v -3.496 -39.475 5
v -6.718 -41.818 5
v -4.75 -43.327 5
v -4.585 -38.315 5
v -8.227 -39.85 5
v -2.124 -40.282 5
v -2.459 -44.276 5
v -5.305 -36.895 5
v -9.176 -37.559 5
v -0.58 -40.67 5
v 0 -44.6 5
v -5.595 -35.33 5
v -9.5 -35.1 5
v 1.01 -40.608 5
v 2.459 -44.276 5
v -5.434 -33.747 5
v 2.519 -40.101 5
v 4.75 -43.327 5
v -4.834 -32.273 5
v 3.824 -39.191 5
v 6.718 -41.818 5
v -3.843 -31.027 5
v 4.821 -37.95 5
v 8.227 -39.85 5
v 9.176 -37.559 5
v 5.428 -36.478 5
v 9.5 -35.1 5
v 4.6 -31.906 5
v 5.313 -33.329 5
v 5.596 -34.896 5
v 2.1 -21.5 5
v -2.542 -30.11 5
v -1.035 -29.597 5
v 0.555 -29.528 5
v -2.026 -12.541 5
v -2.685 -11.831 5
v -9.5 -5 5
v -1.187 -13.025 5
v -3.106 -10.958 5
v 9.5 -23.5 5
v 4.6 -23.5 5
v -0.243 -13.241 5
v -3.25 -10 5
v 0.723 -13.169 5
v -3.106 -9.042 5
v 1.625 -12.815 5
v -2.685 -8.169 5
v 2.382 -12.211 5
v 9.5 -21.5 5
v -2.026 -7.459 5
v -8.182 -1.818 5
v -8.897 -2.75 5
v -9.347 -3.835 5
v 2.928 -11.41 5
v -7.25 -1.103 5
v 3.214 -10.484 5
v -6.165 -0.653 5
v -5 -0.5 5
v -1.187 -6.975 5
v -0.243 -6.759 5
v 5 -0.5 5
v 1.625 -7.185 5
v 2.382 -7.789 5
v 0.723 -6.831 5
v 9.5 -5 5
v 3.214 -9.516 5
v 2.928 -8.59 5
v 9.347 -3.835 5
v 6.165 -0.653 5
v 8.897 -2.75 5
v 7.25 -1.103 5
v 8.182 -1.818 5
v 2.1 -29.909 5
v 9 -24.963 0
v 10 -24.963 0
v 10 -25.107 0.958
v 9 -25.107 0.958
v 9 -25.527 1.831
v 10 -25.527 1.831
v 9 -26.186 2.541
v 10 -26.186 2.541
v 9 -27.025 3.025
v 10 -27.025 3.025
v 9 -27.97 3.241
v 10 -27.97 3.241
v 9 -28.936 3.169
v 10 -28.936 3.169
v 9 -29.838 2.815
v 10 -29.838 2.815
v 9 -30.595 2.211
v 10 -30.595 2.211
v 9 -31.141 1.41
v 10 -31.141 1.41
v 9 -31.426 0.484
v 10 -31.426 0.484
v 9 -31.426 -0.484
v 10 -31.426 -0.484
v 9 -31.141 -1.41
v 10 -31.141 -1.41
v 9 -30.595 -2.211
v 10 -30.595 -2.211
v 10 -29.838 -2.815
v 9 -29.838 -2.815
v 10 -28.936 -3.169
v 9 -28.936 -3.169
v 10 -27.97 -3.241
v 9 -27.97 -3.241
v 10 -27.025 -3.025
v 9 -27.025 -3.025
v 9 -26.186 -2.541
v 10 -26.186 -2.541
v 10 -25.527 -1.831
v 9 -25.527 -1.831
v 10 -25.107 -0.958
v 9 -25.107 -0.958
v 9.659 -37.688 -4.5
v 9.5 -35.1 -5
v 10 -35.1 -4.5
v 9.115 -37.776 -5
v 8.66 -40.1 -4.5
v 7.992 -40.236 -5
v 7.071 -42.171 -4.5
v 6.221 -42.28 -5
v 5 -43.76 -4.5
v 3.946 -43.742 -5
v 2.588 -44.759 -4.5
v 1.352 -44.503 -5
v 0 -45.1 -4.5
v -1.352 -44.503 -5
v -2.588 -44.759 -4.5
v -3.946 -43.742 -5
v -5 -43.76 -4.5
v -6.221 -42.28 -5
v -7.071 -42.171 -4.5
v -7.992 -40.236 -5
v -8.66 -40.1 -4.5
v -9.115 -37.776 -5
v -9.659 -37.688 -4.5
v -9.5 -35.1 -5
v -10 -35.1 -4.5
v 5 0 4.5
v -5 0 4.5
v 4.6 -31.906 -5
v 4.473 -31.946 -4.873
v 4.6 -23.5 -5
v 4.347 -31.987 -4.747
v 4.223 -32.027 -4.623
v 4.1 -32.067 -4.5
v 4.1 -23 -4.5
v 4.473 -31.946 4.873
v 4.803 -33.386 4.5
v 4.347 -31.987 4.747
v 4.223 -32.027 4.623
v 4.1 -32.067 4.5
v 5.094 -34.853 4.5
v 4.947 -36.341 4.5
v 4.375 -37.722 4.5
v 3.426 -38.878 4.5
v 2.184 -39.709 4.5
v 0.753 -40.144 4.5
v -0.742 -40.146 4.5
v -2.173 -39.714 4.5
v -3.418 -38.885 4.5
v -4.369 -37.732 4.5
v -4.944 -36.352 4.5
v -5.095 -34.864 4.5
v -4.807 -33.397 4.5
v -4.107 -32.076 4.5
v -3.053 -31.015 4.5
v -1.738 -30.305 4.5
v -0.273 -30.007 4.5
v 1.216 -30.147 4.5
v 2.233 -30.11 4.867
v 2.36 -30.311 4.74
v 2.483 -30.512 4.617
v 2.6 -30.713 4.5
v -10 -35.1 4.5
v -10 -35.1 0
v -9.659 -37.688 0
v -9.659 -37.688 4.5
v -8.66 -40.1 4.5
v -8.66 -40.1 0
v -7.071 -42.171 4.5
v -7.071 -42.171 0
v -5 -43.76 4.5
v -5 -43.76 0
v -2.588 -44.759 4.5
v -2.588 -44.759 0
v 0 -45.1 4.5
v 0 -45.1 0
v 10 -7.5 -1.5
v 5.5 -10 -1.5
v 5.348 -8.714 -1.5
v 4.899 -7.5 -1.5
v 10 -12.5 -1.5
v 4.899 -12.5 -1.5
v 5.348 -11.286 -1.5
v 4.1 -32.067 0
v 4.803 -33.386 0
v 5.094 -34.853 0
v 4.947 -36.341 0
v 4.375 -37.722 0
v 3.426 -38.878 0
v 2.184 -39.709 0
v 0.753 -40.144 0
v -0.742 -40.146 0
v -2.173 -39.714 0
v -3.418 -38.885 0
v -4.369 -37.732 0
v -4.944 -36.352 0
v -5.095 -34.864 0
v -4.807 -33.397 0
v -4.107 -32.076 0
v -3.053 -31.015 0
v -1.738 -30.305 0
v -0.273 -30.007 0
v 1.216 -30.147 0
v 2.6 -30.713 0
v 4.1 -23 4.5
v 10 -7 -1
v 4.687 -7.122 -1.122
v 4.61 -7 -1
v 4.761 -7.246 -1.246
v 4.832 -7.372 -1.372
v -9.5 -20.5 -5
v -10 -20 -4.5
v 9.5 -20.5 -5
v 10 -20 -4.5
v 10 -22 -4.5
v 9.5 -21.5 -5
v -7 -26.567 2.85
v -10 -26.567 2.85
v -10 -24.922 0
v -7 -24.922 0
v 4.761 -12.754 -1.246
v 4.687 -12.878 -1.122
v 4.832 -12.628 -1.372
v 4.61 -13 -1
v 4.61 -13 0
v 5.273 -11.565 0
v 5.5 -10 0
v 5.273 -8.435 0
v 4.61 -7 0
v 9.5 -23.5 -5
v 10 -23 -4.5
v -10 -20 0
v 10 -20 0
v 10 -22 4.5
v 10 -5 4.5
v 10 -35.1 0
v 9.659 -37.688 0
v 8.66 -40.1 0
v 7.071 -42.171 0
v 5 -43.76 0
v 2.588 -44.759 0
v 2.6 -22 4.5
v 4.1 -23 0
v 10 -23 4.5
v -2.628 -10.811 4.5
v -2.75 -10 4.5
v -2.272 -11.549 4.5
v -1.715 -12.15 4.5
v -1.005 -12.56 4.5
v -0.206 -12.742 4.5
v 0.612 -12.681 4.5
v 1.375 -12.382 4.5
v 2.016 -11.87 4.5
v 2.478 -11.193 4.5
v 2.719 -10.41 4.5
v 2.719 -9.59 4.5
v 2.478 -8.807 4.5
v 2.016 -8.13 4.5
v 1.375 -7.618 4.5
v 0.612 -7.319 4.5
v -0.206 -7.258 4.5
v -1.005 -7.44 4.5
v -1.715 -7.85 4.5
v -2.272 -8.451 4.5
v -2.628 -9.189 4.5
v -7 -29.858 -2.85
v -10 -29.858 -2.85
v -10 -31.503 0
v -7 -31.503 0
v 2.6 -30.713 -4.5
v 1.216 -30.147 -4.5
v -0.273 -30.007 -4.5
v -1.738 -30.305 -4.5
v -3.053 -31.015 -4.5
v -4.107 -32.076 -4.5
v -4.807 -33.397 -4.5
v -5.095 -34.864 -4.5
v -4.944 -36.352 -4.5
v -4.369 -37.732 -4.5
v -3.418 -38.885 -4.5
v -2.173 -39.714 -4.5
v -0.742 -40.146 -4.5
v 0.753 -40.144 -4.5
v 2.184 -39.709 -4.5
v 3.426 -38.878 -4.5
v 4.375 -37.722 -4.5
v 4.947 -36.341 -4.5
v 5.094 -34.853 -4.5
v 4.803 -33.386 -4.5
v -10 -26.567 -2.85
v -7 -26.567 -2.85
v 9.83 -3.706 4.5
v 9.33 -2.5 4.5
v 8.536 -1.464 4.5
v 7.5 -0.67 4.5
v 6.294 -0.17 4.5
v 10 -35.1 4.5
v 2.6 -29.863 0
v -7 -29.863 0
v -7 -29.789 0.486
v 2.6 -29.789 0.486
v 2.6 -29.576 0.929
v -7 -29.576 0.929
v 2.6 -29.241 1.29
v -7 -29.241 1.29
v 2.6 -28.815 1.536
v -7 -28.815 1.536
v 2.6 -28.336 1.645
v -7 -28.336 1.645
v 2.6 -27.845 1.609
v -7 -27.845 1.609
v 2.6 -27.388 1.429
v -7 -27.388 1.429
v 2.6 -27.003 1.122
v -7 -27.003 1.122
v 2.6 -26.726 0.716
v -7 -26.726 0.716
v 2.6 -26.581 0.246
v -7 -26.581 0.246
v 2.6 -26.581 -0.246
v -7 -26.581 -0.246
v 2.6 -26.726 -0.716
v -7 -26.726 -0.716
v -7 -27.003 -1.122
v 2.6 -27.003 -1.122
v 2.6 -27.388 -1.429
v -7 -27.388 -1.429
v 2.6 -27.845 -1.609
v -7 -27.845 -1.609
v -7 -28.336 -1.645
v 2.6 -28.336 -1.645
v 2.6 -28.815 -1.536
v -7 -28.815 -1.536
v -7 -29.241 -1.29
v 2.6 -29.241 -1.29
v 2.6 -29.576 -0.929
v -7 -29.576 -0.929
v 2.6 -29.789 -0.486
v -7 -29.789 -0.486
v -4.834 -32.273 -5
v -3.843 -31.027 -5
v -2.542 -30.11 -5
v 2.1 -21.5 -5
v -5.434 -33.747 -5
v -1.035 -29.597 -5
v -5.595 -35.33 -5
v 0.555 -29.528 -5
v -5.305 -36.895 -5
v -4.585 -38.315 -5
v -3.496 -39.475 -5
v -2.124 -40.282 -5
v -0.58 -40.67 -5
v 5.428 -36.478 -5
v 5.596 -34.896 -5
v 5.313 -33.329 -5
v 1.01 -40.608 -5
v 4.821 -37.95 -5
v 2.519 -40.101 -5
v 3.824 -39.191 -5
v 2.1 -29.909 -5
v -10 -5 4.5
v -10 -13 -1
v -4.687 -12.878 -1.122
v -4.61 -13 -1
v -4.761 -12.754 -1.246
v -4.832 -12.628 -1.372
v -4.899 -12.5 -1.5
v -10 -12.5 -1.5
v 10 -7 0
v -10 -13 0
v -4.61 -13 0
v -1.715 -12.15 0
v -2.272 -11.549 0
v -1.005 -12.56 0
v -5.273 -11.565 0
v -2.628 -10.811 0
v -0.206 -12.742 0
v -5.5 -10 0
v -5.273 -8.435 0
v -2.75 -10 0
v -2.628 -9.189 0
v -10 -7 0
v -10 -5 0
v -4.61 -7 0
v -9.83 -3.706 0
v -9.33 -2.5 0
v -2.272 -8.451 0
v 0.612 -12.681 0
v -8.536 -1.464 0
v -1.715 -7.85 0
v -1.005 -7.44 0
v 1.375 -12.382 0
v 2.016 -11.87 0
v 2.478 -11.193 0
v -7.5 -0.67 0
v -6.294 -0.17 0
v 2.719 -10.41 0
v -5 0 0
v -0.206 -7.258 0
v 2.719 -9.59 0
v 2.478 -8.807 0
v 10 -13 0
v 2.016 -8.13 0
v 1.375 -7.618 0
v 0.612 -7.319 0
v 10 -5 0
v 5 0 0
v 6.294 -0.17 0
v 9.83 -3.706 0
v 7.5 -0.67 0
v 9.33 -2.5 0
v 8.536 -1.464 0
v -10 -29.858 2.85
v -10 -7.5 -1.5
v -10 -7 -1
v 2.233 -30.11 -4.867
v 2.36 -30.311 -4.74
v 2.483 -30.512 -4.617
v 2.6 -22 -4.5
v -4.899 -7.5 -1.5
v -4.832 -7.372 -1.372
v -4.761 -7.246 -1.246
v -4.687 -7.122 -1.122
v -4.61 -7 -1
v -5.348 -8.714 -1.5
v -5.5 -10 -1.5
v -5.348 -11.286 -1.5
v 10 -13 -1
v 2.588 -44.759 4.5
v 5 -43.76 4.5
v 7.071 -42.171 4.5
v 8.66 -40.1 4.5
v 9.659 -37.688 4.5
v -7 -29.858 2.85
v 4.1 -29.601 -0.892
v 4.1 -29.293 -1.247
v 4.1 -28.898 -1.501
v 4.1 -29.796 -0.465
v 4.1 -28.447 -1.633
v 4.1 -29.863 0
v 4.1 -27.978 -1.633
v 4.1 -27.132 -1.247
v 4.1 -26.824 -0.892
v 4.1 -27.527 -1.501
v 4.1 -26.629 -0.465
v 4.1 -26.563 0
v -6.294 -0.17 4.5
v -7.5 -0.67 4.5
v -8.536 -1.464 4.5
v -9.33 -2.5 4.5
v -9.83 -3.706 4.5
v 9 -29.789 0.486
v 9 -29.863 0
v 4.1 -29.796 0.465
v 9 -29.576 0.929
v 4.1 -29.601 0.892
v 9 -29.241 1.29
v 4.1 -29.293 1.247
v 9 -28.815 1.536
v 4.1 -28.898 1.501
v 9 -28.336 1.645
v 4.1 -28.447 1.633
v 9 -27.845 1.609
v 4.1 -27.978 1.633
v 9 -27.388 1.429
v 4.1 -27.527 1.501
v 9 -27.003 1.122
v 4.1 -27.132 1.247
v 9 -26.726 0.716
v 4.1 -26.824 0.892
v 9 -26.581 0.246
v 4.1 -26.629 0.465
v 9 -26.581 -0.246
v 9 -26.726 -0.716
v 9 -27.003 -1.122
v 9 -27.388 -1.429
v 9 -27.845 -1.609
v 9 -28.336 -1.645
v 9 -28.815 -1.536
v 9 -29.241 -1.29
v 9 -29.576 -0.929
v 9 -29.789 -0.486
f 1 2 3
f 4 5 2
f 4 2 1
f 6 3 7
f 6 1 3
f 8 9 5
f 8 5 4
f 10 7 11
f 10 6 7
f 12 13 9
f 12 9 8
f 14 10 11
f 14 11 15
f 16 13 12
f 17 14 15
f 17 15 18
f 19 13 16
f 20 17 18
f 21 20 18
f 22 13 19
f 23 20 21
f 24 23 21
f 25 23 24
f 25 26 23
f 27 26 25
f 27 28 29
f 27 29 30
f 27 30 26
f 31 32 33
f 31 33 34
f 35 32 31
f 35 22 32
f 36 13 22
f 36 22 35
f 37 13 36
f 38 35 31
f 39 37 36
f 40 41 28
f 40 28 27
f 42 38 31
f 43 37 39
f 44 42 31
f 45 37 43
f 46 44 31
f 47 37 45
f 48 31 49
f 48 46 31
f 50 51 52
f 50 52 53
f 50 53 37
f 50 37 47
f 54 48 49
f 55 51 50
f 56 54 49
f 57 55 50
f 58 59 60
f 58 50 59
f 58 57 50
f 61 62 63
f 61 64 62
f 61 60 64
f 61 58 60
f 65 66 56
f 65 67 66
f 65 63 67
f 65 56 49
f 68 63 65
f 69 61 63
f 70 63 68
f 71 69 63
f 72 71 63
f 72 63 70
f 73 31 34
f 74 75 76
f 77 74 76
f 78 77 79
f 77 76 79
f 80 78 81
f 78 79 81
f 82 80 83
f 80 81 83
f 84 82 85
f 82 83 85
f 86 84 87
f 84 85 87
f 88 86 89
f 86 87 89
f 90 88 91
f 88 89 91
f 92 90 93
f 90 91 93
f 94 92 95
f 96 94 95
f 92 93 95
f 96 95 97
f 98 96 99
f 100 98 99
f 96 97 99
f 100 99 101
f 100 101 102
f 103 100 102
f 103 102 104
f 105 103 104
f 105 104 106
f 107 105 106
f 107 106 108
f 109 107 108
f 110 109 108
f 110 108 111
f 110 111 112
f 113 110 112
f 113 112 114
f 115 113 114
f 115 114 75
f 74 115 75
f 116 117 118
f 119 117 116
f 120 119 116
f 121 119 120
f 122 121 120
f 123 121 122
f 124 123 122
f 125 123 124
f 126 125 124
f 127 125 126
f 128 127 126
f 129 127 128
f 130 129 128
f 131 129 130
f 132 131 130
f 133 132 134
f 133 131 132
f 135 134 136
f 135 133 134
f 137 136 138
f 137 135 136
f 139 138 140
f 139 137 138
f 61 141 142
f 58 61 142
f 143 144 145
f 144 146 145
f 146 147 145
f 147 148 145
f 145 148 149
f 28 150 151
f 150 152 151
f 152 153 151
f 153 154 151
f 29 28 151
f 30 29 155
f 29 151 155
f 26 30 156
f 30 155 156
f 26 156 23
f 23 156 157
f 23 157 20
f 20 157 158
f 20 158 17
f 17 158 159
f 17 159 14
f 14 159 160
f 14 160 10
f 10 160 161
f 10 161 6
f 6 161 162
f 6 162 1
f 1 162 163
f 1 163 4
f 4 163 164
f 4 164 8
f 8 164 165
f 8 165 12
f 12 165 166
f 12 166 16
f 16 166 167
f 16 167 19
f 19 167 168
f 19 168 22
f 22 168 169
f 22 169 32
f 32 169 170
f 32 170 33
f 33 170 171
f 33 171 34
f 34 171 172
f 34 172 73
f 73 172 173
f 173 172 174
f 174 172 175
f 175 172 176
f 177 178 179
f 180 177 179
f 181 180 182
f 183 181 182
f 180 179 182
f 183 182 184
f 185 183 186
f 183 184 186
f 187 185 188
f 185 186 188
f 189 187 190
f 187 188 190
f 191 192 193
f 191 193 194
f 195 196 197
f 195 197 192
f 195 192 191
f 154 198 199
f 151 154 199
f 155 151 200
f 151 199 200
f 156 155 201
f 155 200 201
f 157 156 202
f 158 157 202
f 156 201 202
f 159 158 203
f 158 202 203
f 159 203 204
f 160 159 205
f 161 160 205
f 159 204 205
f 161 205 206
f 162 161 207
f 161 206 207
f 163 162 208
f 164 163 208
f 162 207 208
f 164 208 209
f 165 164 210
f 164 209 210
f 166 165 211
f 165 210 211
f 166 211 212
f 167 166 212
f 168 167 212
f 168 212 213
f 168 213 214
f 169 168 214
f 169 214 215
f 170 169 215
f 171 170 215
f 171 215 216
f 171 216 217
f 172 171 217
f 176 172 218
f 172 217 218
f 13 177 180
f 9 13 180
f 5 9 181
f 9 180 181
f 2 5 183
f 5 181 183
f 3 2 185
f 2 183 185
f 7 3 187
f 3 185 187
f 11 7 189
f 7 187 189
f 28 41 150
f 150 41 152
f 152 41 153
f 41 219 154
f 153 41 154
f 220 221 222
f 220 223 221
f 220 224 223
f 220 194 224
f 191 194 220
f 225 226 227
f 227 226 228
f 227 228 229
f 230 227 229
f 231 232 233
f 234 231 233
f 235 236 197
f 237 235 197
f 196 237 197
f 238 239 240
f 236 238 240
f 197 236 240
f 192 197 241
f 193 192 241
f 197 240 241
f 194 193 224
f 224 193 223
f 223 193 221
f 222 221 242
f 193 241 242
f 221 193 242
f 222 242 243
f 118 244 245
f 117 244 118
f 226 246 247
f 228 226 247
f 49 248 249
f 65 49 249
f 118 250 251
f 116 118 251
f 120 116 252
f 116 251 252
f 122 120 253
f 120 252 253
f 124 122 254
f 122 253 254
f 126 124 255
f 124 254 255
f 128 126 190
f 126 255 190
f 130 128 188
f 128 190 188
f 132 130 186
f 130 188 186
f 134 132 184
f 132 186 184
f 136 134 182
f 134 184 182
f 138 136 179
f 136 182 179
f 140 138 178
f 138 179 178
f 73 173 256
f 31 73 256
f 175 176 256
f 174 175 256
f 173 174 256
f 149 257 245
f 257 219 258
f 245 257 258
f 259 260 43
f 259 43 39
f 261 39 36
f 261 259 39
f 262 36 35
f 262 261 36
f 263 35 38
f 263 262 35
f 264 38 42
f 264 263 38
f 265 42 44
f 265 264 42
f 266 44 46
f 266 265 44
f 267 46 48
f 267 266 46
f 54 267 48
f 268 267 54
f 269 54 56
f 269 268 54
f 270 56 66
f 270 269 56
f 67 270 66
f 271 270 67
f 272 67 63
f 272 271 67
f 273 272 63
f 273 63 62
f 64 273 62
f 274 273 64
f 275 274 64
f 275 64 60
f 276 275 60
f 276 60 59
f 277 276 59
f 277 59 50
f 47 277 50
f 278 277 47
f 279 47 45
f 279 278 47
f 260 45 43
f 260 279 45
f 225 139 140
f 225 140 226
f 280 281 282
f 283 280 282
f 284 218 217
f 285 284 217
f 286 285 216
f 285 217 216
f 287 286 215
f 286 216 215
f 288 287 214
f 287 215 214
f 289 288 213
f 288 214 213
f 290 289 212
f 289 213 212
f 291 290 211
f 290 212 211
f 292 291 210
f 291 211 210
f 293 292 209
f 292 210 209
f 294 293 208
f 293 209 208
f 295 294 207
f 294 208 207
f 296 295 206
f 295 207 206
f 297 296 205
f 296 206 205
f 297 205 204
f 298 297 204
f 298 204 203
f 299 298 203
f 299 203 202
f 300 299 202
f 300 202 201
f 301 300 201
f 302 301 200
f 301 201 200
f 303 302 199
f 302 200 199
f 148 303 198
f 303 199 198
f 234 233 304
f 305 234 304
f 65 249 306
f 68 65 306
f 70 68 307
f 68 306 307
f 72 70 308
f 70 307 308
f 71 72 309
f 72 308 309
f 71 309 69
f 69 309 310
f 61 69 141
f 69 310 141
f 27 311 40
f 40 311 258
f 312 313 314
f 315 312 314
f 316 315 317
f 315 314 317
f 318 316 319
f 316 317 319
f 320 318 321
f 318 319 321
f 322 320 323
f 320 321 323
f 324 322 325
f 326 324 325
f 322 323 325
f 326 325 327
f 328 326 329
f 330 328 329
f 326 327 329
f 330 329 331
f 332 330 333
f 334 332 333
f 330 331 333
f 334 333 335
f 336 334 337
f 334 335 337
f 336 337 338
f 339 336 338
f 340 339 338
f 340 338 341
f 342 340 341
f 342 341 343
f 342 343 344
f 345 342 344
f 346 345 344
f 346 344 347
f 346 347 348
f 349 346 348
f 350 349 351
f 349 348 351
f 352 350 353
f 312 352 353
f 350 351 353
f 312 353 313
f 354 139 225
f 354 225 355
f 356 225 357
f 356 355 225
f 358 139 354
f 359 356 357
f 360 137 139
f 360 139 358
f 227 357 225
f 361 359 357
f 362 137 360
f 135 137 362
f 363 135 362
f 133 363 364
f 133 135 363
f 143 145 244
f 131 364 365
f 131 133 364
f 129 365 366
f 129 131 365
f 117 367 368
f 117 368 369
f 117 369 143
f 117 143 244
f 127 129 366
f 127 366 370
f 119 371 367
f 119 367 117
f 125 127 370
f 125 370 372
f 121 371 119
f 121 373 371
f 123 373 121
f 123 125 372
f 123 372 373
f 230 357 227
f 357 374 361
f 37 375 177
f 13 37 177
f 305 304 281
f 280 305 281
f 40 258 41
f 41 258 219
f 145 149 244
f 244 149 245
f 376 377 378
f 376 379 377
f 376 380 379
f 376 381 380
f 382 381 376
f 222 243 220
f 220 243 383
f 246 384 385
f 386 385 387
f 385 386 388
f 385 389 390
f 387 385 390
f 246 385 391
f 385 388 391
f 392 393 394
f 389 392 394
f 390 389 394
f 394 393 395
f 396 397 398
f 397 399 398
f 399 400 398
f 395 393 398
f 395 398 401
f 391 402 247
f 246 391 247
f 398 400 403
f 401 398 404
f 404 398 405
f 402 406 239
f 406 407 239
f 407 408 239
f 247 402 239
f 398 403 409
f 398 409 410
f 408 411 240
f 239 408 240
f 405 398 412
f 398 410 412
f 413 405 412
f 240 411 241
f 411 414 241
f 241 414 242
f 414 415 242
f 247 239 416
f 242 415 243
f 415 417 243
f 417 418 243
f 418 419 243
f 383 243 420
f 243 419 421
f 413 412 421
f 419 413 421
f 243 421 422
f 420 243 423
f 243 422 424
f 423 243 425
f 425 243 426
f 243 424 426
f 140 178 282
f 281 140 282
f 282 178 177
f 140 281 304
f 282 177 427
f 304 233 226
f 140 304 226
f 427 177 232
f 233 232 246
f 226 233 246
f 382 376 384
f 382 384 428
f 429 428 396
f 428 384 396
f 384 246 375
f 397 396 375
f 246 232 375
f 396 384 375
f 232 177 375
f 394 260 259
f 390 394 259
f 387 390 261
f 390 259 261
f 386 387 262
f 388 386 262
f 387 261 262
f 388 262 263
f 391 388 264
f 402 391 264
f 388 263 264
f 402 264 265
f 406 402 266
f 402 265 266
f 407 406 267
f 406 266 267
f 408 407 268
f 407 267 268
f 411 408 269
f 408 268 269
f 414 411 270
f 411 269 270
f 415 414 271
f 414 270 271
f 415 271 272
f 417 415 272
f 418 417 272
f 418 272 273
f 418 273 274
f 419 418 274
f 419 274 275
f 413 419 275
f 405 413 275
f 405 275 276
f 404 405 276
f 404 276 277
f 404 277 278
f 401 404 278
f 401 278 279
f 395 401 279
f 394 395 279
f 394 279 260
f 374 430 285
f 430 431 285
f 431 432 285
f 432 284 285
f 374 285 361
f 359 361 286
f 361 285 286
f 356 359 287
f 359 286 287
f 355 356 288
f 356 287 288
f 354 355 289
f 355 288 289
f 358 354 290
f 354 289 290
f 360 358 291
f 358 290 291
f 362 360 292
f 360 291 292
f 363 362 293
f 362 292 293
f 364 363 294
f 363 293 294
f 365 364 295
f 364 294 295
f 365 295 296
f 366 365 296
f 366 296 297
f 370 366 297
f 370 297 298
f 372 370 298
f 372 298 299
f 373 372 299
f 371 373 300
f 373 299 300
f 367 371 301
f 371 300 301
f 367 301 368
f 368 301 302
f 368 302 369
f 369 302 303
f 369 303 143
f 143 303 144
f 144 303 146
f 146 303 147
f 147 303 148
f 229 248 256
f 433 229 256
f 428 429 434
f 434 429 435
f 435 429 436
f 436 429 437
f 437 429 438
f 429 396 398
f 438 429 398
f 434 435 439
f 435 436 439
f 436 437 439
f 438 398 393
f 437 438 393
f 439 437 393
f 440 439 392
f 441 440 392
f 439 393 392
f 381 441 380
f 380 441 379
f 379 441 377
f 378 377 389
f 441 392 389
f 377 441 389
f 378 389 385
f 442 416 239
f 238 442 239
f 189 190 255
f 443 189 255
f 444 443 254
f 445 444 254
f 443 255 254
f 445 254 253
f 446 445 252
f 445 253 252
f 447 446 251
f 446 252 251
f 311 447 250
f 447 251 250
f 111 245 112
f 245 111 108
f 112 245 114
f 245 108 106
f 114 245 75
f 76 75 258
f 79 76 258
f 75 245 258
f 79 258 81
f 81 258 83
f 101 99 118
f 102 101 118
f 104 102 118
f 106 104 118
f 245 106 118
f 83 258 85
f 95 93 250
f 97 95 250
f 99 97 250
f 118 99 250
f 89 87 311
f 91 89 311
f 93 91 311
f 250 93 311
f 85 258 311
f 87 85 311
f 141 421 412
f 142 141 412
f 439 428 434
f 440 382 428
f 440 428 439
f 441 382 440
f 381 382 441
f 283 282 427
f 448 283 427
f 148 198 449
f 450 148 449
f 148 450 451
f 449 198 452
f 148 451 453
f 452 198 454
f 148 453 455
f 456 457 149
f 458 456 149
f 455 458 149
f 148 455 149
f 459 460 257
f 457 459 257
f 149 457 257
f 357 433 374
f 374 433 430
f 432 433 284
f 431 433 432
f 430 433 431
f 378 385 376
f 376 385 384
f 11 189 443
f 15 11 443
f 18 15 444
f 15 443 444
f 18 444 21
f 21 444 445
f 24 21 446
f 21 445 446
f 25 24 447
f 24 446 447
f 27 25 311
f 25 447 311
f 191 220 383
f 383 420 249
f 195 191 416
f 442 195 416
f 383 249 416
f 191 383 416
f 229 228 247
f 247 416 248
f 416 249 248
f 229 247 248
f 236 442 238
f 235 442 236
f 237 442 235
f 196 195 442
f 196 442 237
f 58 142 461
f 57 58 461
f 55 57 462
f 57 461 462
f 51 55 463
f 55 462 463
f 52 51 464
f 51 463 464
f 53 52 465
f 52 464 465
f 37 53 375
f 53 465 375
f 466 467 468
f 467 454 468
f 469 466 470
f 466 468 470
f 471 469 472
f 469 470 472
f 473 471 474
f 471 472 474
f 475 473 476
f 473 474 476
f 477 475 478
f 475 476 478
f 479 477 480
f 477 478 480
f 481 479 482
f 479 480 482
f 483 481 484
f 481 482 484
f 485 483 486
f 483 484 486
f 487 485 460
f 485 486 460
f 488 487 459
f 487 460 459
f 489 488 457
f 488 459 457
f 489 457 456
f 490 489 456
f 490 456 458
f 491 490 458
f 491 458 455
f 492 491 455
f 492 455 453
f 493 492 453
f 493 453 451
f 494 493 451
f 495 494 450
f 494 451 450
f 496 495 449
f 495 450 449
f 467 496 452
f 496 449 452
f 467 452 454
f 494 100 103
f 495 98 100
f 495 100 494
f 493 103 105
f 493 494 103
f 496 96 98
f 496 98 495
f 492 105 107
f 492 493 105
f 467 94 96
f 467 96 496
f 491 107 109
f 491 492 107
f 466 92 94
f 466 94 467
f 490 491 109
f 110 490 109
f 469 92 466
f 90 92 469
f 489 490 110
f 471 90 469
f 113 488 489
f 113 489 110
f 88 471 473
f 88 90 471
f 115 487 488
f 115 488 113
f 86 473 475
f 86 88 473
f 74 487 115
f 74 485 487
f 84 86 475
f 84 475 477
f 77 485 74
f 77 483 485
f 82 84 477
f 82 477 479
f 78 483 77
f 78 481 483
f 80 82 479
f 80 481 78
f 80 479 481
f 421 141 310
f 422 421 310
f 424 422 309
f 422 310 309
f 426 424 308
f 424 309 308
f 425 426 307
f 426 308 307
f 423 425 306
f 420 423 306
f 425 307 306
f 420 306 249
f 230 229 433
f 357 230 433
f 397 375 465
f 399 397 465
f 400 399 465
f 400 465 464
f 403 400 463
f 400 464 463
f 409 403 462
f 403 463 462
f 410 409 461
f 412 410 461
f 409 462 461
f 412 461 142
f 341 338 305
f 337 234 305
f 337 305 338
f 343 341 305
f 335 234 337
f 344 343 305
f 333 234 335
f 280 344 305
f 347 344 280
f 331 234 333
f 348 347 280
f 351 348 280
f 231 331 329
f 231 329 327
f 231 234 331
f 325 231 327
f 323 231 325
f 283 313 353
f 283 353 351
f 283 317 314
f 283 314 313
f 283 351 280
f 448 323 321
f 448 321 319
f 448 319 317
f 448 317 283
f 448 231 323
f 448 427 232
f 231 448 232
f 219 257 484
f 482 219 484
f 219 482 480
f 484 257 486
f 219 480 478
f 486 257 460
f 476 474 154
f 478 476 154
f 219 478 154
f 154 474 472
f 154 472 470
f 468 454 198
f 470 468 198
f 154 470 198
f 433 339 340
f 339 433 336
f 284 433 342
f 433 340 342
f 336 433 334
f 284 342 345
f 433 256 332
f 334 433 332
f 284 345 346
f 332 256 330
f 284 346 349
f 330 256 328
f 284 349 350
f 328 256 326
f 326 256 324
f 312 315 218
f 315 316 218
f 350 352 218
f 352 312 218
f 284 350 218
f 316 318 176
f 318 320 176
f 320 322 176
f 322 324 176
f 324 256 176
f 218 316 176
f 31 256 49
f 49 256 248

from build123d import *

# Parameters (mm, degrees)
F1_DEPTH       = 5
F3_DEPTH       = 5
F5_D           = 3.3
F5_DEPTH       = 26
F5_CBORE_D     = 6.5
F5_CBORE_DEPTH = 1
F5_TIP         = 0.9914200214
F7_DEPTH       = 3
F9_DEPTH       = 1.5
F10_D          = 5.5
F10_DEPTH      = 26
F10_TIP        = 1.6523667023
F11_SIZE       = 0.5
F13_R          = 5
F14_SIZE       = 0.5


with BuildPart() as f1:
    # F0 (on Top) → F1 (new body)
    with BuildSketch(Plane.XY):
        with BuildLine():
            Line((10, 0), (-10, 0))
            Line((-10, 0), (-10, -35.1))
            ThreePointArc((-10, -35.1), (-7.0710678119, -42.1710678119), (0, -45.1))
            ThreePointArc((0, -45.1), (7.0710678119, -42.1710678119), (10, -35.1))
            Line((10, -35.1), (10, -23))
            Line((10, -23), (4.1, -23))
            Line((4.1, -23), (4.1, -32.0668498224))
            ThreePointArc((4.1, -32.0668498224), (-3.4177556675, -38.8853594542), (2.6, -30.7125178063))
            Line((2.6, -30.7125178063), (2.6, -22))
            Line((2.6, -22), (10, -22))
            Line((10, -22), (10, 0))
        make_face()
    extrude(amount=F1_DEPTH)

    # F2 (on face) → F3 (join)
    with BuildSketch(Plane(origin=(0, 0, 0), x_dir=(1, 0, 0), z_dir=(0, 0, -1))):
        with BuildLine():
            Line((-10, 35.1), (-10, 20))
            Line((-10, 20), (10, 20))
            Line((10, 20), (10, 22))
            Line((10, 22), (2.6, 22))
            Line((2.6, 22), (2.6, 30.7125178063))
            ThreePointArc((2.6, 30.7125178063), (-3.4177556675, 38.8853594542), (4.1, 32.0668498224))
            Line((4.1, 32.0668498224), (4.1, 23))
            Line((4.1, 23), (10, 23))
            Line((10, 23), (10, 35.1))
            ThreePointArc((10, 35.1), (0, 45.1), (-10, 35.1))
        make_face()
    extrude(amount=F3_DEPTH)

    # F5
    with Locations(Plane.YZ.offset(10)):
        with Locations((-28.2125178063, 0)):
            CounterBoreHole(F5_D / 2, F5_CBORE_D / 2, F5_CBORE_DEPTH, depth=F5_DEPTH)
            with Locations((0, 0, -(F5_DEPTH + F5_TIP / 2))):  # 118° drill point
                Cone(0, F5_D / 2, F5_TIP, mode=Mode.SUBTRACT)

    # F6 (on face) → F7 (cut)
    with BuildSketch(Plane(origin=(-10, 0, 0), x_dir=(0, -1, 0), z_dir=(-1, 0, 0))):
        with BuildLine():
            Line((24.9216212719, 0), (26.5670695391, -2.85))
            Line((26.5670695391, -2.85), (29.8579660735, -2.85))
            Line((29.8579660735, -2.85), (31.5034143407, 0))
            Line((31.5034143407, 0), (29.8625178063, 0))
            ThreePointArc((29.8625178063, 0), (28.2125178063, -1.65), (26.5625178063, 0))
            Line((26.5625178063, 0), (24.9216212719, 0))
        make_face()
        with BuildLine():
            Line((26.5670695391, 2.85), (24.9216212719, 0))
            Line((24.9216212719, 0), (26.5625178063, 0))
            ThreePointArc((26.5625178063, 0), (28.2125178063, 1.65), (29.8625178063, 0))
            Line((29.8625178063, 0), (31.5034143407, 0))
            Line((31.5034143407, 0), (29.8579660735, 2.85))
            Line((29.8579660735, 2.85), (26.5670695391, 2.85))
        make_face()
    extrude(amount=-F7_DEPTH, mode=Mode.SUBTRACT)

    # F8 (on face) → F9 (join)
    with BuildSketch(Plane(origin=(0, 0, 0), x_dir=(1, 0, 0), z_dir=(0, 0, -1))):
        with BuildLine():
            ThreePointArc((-4.6097722286, 7), (-5.5, 10), (-4.6097722286, 13))
            Line((-4.6097722286, 13), (-10, 13))
            Line((-10, 13), (-10, 7))
            Line((-10, 7), (-4.6097722286, 7))
        make_face()
        with BuildLine():
            Line((10, 7), (10, 13))
            Line((10, 13), (4.6097722286, 13))
            ThreePointArc((4.6097722286, 13), (5.5, 10), (4.6097722286, 7))
            Line((4.6097722286, 7), (10, 7))
        make_face()
    extrude(amount=F9_DEPTH)

    # F10
    with Locations(Plane(origin=(0, 0, 0), x_dir=(1, 0, 0), z_dir=(0, 0, -1))):
        with Locations((0, 10)):
            Hole(F10_D / 2, depth=F10_DEPTH)
            with Locations((0, 0, -(F10_DEPTH + F10_TIP / 2))):  # 118° drill point
                Cone(0, F10_D / 2, F10_TIP, mode=Mode.SUBTRACT)

    # F11
    f11_edges = [f1.edges().sort_by_distance(p)[0] for p in [
        (-7.304886, -7, -1.5),
        (-7.304886, -13, -1.5),
        (7.304886, -13, -1.5),
        (7.304886, -7, -1.5),
    ]]
    chamfer(f11_edges, length=F11_SIZE)

    # F13
    f13_edges = [f1.edges().sort_by_distance(p)[0] for p in [
        (10, 0, 2.5),
        (-10, 0, 2.5),
    ]]
    fillet(f13_edges, radius=F13_R)

    # F14
    f14_edges = [f1.edges().sort_by_distance(p)[0] for p in [
        (10, -13.5, 5),
        (8.535534, -1.464466, 5),
        (6.3, -22, 5),
        (0, 0, 5),
        (2.6, -26.356259, 5),
        (-8.535534, -1.464466, 5),
        (-3.417756, -38.885359, 5),
        (-10, -20.05, 5),
        (4.1, -27.533425, 5),
        (0, -45.1, 5),
        (7.05, -23, 5),
        (10, -29.05, 5),
        (-2.75, -10, 5),
        (0, -45.1, -5),
        (-10, -27.55, -5),
        (0, -20, -5),
        (10, -21, -5),
        (6.3, -22, -5),
        (2.6, -26.356259, -5),
        (-3.417756, -38.885359, -5),
        (4.1, -27.533425, -5),
        (7.05, -23, -5),
        (10, -29.05, -5),
    ]]
    chamfer(f14_edges, length=F14_SIZE)


solid = f1.part
